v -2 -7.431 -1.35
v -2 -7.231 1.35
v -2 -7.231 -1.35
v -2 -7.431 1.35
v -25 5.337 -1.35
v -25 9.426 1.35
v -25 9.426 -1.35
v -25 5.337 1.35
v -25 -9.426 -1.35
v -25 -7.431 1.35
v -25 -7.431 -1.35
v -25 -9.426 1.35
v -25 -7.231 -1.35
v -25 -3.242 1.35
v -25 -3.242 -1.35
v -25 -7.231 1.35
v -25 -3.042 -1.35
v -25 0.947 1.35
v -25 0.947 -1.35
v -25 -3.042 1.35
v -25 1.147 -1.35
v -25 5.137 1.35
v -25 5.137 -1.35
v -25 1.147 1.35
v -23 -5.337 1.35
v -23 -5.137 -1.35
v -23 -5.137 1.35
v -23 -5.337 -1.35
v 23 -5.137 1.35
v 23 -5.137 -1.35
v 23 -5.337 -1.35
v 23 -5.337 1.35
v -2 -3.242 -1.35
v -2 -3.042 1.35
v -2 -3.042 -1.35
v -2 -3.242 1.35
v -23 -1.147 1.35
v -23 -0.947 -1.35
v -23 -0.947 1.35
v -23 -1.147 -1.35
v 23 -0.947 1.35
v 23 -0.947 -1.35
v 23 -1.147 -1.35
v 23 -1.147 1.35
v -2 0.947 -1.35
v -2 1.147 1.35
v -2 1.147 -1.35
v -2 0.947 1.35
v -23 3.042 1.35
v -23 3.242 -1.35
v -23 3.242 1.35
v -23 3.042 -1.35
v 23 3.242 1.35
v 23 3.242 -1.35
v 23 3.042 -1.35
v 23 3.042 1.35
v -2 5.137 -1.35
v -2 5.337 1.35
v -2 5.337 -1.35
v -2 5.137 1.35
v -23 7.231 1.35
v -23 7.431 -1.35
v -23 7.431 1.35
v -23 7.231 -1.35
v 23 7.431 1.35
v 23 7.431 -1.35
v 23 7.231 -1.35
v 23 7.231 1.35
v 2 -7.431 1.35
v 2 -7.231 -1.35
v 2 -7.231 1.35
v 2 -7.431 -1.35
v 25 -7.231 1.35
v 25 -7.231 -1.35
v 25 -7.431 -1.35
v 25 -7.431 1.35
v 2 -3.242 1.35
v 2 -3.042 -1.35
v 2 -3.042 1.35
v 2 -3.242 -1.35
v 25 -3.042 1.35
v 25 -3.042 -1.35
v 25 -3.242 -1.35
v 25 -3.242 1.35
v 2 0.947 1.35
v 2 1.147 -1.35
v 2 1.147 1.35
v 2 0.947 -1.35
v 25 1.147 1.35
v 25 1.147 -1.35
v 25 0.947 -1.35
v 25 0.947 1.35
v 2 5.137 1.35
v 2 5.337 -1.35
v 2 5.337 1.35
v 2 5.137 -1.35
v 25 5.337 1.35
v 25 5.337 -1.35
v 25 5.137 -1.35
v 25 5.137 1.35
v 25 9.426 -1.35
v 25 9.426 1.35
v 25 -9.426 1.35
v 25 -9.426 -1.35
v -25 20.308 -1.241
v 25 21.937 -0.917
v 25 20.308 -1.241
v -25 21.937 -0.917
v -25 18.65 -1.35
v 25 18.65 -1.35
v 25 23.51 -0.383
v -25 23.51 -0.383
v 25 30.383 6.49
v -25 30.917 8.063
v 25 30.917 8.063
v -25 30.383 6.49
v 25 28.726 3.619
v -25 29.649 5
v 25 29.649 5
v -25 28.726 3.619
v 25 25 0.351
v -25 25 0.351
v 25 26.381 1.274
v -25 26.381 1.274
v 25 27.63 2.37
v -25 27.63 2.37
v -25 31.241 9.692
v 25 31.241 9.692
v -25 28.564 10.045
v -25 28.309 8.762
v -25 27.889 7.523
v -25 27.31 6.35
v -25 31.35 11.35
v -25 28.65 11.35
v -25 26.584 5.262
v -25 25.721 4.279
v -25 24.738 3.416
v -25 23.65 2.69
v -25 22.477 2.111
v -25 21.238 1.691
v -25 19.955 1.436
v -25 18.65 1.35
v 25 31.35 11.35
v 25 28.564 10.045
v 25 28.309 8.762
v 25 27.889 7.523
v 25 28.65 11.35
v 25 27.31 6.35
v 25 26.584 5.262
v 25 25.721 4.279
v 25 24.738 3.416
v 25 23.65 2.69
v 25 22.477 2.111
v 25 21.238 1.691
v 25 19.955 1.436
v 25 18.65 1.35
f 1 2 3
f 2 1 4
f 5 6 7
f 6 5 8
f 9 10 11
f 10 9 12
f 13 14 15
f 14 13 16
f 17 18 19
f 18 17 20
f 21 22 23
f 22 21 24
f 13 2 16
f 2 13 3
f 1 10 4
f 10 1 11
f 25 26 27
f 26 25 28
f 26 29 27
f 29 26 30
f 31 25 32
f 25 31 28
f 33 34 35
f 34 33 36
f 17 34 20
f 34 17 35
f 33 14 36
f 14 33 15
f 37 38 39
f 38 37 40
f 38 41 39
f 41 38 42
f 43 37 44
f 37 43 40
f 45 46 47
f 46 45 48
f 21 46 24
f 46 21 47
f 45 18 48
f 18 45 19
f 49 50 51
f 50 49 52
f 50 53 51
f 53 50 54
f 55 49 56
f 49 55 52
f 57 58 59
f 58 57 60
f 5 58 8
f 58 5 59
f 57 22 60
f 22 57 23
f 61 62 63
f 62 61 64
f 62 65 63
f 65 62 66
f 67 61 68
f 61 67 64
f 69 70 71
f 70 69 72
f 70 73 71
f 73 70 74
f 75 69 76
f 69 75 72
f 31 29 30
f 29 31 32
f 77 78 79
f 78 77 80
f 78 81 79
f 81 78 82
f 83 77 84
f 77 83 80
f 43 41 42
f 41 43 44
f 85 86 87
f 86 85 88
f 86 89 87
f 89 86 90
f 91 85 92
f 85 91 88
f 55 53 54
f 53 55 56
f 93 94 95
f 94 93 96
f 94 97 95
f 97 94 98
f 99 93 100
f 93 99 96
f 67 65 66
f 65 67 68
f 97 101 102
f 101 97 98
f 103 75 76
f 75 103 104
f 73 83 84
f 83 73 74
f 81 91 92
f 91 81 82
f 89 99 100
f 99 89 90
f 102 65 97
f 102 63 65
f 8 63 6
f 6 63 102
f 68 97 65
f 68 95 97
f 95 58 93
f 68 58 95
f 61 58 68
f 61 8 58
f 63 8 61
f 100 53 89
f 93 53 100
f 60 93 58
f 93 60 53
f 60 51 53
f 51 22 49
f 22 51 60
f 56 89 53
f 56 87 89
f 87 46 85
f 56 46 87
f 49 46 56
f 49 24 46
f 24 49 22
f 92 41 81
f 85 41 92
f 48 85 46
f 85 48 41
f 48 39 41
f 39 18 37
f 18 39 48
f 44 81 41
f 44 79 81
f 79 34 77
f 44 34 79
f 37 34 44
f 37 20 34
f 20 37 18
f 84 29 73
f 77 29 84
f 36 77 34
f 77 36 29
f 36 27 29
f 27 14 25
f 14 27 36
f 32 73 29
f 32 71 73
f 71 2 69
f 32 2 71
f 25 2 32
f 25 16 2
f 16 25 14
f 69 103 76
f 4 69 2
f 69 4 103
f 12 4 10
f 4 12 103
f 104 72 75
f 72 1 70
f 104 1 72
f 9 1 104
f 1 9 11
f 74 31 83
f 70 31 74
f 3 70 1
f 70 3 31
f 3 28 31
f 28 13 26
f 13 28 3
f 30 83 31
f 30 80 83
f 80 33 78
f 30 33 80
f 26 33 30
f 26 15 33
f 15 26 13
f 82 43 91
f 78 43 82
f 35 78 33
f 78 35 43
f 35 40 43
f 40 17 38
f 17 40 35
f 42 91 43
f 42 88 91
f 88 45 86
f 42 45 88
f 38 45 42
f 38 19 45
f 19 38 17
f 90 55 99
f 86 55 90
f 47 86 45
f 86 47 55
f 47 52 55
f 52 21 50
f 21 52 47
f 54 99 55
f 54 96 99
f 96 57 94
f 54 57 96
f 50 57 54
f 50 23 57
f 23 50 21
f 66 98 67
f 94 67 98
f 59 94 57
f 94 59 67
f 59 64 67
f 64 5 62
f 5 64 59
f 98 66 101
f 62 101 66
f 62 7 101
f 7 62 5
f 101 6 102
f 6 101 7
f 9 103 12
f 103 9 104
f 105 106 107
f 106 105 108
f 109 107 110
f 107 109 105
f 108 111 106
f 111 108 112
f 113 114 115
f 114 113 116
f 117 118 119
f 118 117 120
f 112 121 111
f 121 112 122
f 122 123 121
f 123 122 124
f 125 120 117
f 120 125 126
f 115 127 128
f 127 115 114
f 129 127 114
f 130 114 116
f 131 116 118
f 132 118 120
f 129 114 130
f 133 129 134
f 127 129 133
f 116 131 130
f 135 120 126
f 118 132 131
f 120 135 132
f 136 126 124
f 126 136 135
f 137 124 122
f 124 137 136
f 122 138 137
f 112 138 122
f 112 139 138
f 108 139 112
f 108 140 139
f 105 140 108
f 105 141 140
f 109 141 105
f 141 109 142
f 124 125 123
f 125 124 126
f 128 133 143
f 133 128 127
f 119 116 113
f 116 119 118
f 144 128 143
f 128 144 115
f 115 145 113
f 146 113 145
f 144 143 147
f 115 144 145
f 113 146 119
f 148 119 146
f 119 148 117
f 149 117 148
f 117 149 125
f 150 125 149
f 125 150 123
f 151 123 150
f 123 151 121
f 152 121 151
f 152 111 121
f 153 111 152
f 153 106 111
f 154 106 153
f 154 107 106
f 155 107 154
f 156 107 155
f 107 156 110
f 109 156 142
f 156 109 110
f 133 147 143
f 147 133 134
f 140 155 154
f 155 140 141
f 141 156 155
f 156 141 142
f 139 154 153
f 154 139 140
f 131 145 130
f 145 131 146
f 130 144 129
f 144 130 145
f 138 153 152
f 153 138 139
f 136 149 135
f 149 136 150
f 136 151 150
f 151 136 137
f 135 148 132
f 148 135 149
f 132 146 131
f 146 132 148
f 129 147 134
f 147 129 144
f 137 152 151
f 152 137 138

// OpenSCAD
hingeHeight = 50;
slotRepeatMin=2; slotLengthMin=25; slotLengthGap = 2; slotWidth = 0.2;

PI = 3.142*1.2; //Add a fudge factor for the bend radius

function hingeLength(angle, radius) = 2*PI*radius*(angle/360);

//Draws a flat 3D model of a living hinge
livingHinge2D(hingeLength(90,10), hingeHeight, 2.7);

//Draws a rounded 3D model of a living hinge
translate([0, 30, 0])
rotate([0, 90, 0])
livingHinge3D(90, 10, hingeHeight, 2.7);

module livingHinge2D(panelLength, panelWidth, panelThickness) 
{
  widthDiv = floor(panelWidth/slotLengthMin);
  noSlots = floor(panelLength/slotRepeatMin)-1;
  slotRepeat = (panelWidth/widthDiv); 
  slotLength = panelLength / (noSlots + 1);

  difference() 
  {
    cube([panelWidth, panelLength, panelThickness], true);
    
    translate([-panelWidth/2,-panelLength/2,-panelThickness/2])
    for(y=[0:(widthDiv*2)-1]) 
    {           
      for (x =[1:noSlots])
      {
        if(x%2)
          translate([y*slotRepeat,0,0])
            translate([slotLengthGap*(y%2),(slotLength *x)-slotWidth/2,0])
              cube([slotRepeat-slotLengthGap, slotWidth, panelThickness]);
        else
          translate([y*slotRepeat,0,0])
            translate([slotLengthGap*(1-(y%2)),(slotLength *x)-slotWidth/2,0])
              cube([slotRepeat-slotLengthGap, slotWidth, panelThickness]);
      }
    }
  }
}

module livingHinge3D(angle, radius, panelWidth, panelThickness) 
{
  module pie(radius, angle, height, spin=0) 
  {
    // submodules
    module pieCube() 
    {
      translate([-radius - 1, 0, -1]) 
        cube([2*(radius + 1), radius, height + 2]);
    }
        
    ang = abs(angle % 360);
    negAng = angle < 0 ? angle : 0;
        
    rotate([0,0,negAng + spin]) 
    {
      if (angle == 0) 
        cylinder(r=radius, h=height, $fn=48);
      
      else if (abs(angle) > 0 && ang <= 180) 
      {
        difference() 
        {
          intersection() 
          {
            cylinder(r=radius, h=height, $fn=48);
            translate([0,0,0]) 
              pieCube();
          }
          
          rotate([0, 0, ang])
            pieCube();
        }
      } 
      else if (ang > 180) 
      {
        intersection() 
        {
          cylinder(r=radius, h=height, $fn=48);
          union() 
          {
            translate([0, 0, 0])
              pieCube();
            
            rotate([0, 0, ang - 180])
              pieCube();
          }
        }
      }
    }
  }
  
  translate([-(radius+(panelThickness/2)),-(radius+(panelThickness/2)),-panelWidth/2])
    rotate([0,0,0])
      difference() 
      {
        pie(radius+panelThickness, angle, panelWidth, spin = 0);
        pie(radius, angle, panelWidth, spin = 0);
      }
}
